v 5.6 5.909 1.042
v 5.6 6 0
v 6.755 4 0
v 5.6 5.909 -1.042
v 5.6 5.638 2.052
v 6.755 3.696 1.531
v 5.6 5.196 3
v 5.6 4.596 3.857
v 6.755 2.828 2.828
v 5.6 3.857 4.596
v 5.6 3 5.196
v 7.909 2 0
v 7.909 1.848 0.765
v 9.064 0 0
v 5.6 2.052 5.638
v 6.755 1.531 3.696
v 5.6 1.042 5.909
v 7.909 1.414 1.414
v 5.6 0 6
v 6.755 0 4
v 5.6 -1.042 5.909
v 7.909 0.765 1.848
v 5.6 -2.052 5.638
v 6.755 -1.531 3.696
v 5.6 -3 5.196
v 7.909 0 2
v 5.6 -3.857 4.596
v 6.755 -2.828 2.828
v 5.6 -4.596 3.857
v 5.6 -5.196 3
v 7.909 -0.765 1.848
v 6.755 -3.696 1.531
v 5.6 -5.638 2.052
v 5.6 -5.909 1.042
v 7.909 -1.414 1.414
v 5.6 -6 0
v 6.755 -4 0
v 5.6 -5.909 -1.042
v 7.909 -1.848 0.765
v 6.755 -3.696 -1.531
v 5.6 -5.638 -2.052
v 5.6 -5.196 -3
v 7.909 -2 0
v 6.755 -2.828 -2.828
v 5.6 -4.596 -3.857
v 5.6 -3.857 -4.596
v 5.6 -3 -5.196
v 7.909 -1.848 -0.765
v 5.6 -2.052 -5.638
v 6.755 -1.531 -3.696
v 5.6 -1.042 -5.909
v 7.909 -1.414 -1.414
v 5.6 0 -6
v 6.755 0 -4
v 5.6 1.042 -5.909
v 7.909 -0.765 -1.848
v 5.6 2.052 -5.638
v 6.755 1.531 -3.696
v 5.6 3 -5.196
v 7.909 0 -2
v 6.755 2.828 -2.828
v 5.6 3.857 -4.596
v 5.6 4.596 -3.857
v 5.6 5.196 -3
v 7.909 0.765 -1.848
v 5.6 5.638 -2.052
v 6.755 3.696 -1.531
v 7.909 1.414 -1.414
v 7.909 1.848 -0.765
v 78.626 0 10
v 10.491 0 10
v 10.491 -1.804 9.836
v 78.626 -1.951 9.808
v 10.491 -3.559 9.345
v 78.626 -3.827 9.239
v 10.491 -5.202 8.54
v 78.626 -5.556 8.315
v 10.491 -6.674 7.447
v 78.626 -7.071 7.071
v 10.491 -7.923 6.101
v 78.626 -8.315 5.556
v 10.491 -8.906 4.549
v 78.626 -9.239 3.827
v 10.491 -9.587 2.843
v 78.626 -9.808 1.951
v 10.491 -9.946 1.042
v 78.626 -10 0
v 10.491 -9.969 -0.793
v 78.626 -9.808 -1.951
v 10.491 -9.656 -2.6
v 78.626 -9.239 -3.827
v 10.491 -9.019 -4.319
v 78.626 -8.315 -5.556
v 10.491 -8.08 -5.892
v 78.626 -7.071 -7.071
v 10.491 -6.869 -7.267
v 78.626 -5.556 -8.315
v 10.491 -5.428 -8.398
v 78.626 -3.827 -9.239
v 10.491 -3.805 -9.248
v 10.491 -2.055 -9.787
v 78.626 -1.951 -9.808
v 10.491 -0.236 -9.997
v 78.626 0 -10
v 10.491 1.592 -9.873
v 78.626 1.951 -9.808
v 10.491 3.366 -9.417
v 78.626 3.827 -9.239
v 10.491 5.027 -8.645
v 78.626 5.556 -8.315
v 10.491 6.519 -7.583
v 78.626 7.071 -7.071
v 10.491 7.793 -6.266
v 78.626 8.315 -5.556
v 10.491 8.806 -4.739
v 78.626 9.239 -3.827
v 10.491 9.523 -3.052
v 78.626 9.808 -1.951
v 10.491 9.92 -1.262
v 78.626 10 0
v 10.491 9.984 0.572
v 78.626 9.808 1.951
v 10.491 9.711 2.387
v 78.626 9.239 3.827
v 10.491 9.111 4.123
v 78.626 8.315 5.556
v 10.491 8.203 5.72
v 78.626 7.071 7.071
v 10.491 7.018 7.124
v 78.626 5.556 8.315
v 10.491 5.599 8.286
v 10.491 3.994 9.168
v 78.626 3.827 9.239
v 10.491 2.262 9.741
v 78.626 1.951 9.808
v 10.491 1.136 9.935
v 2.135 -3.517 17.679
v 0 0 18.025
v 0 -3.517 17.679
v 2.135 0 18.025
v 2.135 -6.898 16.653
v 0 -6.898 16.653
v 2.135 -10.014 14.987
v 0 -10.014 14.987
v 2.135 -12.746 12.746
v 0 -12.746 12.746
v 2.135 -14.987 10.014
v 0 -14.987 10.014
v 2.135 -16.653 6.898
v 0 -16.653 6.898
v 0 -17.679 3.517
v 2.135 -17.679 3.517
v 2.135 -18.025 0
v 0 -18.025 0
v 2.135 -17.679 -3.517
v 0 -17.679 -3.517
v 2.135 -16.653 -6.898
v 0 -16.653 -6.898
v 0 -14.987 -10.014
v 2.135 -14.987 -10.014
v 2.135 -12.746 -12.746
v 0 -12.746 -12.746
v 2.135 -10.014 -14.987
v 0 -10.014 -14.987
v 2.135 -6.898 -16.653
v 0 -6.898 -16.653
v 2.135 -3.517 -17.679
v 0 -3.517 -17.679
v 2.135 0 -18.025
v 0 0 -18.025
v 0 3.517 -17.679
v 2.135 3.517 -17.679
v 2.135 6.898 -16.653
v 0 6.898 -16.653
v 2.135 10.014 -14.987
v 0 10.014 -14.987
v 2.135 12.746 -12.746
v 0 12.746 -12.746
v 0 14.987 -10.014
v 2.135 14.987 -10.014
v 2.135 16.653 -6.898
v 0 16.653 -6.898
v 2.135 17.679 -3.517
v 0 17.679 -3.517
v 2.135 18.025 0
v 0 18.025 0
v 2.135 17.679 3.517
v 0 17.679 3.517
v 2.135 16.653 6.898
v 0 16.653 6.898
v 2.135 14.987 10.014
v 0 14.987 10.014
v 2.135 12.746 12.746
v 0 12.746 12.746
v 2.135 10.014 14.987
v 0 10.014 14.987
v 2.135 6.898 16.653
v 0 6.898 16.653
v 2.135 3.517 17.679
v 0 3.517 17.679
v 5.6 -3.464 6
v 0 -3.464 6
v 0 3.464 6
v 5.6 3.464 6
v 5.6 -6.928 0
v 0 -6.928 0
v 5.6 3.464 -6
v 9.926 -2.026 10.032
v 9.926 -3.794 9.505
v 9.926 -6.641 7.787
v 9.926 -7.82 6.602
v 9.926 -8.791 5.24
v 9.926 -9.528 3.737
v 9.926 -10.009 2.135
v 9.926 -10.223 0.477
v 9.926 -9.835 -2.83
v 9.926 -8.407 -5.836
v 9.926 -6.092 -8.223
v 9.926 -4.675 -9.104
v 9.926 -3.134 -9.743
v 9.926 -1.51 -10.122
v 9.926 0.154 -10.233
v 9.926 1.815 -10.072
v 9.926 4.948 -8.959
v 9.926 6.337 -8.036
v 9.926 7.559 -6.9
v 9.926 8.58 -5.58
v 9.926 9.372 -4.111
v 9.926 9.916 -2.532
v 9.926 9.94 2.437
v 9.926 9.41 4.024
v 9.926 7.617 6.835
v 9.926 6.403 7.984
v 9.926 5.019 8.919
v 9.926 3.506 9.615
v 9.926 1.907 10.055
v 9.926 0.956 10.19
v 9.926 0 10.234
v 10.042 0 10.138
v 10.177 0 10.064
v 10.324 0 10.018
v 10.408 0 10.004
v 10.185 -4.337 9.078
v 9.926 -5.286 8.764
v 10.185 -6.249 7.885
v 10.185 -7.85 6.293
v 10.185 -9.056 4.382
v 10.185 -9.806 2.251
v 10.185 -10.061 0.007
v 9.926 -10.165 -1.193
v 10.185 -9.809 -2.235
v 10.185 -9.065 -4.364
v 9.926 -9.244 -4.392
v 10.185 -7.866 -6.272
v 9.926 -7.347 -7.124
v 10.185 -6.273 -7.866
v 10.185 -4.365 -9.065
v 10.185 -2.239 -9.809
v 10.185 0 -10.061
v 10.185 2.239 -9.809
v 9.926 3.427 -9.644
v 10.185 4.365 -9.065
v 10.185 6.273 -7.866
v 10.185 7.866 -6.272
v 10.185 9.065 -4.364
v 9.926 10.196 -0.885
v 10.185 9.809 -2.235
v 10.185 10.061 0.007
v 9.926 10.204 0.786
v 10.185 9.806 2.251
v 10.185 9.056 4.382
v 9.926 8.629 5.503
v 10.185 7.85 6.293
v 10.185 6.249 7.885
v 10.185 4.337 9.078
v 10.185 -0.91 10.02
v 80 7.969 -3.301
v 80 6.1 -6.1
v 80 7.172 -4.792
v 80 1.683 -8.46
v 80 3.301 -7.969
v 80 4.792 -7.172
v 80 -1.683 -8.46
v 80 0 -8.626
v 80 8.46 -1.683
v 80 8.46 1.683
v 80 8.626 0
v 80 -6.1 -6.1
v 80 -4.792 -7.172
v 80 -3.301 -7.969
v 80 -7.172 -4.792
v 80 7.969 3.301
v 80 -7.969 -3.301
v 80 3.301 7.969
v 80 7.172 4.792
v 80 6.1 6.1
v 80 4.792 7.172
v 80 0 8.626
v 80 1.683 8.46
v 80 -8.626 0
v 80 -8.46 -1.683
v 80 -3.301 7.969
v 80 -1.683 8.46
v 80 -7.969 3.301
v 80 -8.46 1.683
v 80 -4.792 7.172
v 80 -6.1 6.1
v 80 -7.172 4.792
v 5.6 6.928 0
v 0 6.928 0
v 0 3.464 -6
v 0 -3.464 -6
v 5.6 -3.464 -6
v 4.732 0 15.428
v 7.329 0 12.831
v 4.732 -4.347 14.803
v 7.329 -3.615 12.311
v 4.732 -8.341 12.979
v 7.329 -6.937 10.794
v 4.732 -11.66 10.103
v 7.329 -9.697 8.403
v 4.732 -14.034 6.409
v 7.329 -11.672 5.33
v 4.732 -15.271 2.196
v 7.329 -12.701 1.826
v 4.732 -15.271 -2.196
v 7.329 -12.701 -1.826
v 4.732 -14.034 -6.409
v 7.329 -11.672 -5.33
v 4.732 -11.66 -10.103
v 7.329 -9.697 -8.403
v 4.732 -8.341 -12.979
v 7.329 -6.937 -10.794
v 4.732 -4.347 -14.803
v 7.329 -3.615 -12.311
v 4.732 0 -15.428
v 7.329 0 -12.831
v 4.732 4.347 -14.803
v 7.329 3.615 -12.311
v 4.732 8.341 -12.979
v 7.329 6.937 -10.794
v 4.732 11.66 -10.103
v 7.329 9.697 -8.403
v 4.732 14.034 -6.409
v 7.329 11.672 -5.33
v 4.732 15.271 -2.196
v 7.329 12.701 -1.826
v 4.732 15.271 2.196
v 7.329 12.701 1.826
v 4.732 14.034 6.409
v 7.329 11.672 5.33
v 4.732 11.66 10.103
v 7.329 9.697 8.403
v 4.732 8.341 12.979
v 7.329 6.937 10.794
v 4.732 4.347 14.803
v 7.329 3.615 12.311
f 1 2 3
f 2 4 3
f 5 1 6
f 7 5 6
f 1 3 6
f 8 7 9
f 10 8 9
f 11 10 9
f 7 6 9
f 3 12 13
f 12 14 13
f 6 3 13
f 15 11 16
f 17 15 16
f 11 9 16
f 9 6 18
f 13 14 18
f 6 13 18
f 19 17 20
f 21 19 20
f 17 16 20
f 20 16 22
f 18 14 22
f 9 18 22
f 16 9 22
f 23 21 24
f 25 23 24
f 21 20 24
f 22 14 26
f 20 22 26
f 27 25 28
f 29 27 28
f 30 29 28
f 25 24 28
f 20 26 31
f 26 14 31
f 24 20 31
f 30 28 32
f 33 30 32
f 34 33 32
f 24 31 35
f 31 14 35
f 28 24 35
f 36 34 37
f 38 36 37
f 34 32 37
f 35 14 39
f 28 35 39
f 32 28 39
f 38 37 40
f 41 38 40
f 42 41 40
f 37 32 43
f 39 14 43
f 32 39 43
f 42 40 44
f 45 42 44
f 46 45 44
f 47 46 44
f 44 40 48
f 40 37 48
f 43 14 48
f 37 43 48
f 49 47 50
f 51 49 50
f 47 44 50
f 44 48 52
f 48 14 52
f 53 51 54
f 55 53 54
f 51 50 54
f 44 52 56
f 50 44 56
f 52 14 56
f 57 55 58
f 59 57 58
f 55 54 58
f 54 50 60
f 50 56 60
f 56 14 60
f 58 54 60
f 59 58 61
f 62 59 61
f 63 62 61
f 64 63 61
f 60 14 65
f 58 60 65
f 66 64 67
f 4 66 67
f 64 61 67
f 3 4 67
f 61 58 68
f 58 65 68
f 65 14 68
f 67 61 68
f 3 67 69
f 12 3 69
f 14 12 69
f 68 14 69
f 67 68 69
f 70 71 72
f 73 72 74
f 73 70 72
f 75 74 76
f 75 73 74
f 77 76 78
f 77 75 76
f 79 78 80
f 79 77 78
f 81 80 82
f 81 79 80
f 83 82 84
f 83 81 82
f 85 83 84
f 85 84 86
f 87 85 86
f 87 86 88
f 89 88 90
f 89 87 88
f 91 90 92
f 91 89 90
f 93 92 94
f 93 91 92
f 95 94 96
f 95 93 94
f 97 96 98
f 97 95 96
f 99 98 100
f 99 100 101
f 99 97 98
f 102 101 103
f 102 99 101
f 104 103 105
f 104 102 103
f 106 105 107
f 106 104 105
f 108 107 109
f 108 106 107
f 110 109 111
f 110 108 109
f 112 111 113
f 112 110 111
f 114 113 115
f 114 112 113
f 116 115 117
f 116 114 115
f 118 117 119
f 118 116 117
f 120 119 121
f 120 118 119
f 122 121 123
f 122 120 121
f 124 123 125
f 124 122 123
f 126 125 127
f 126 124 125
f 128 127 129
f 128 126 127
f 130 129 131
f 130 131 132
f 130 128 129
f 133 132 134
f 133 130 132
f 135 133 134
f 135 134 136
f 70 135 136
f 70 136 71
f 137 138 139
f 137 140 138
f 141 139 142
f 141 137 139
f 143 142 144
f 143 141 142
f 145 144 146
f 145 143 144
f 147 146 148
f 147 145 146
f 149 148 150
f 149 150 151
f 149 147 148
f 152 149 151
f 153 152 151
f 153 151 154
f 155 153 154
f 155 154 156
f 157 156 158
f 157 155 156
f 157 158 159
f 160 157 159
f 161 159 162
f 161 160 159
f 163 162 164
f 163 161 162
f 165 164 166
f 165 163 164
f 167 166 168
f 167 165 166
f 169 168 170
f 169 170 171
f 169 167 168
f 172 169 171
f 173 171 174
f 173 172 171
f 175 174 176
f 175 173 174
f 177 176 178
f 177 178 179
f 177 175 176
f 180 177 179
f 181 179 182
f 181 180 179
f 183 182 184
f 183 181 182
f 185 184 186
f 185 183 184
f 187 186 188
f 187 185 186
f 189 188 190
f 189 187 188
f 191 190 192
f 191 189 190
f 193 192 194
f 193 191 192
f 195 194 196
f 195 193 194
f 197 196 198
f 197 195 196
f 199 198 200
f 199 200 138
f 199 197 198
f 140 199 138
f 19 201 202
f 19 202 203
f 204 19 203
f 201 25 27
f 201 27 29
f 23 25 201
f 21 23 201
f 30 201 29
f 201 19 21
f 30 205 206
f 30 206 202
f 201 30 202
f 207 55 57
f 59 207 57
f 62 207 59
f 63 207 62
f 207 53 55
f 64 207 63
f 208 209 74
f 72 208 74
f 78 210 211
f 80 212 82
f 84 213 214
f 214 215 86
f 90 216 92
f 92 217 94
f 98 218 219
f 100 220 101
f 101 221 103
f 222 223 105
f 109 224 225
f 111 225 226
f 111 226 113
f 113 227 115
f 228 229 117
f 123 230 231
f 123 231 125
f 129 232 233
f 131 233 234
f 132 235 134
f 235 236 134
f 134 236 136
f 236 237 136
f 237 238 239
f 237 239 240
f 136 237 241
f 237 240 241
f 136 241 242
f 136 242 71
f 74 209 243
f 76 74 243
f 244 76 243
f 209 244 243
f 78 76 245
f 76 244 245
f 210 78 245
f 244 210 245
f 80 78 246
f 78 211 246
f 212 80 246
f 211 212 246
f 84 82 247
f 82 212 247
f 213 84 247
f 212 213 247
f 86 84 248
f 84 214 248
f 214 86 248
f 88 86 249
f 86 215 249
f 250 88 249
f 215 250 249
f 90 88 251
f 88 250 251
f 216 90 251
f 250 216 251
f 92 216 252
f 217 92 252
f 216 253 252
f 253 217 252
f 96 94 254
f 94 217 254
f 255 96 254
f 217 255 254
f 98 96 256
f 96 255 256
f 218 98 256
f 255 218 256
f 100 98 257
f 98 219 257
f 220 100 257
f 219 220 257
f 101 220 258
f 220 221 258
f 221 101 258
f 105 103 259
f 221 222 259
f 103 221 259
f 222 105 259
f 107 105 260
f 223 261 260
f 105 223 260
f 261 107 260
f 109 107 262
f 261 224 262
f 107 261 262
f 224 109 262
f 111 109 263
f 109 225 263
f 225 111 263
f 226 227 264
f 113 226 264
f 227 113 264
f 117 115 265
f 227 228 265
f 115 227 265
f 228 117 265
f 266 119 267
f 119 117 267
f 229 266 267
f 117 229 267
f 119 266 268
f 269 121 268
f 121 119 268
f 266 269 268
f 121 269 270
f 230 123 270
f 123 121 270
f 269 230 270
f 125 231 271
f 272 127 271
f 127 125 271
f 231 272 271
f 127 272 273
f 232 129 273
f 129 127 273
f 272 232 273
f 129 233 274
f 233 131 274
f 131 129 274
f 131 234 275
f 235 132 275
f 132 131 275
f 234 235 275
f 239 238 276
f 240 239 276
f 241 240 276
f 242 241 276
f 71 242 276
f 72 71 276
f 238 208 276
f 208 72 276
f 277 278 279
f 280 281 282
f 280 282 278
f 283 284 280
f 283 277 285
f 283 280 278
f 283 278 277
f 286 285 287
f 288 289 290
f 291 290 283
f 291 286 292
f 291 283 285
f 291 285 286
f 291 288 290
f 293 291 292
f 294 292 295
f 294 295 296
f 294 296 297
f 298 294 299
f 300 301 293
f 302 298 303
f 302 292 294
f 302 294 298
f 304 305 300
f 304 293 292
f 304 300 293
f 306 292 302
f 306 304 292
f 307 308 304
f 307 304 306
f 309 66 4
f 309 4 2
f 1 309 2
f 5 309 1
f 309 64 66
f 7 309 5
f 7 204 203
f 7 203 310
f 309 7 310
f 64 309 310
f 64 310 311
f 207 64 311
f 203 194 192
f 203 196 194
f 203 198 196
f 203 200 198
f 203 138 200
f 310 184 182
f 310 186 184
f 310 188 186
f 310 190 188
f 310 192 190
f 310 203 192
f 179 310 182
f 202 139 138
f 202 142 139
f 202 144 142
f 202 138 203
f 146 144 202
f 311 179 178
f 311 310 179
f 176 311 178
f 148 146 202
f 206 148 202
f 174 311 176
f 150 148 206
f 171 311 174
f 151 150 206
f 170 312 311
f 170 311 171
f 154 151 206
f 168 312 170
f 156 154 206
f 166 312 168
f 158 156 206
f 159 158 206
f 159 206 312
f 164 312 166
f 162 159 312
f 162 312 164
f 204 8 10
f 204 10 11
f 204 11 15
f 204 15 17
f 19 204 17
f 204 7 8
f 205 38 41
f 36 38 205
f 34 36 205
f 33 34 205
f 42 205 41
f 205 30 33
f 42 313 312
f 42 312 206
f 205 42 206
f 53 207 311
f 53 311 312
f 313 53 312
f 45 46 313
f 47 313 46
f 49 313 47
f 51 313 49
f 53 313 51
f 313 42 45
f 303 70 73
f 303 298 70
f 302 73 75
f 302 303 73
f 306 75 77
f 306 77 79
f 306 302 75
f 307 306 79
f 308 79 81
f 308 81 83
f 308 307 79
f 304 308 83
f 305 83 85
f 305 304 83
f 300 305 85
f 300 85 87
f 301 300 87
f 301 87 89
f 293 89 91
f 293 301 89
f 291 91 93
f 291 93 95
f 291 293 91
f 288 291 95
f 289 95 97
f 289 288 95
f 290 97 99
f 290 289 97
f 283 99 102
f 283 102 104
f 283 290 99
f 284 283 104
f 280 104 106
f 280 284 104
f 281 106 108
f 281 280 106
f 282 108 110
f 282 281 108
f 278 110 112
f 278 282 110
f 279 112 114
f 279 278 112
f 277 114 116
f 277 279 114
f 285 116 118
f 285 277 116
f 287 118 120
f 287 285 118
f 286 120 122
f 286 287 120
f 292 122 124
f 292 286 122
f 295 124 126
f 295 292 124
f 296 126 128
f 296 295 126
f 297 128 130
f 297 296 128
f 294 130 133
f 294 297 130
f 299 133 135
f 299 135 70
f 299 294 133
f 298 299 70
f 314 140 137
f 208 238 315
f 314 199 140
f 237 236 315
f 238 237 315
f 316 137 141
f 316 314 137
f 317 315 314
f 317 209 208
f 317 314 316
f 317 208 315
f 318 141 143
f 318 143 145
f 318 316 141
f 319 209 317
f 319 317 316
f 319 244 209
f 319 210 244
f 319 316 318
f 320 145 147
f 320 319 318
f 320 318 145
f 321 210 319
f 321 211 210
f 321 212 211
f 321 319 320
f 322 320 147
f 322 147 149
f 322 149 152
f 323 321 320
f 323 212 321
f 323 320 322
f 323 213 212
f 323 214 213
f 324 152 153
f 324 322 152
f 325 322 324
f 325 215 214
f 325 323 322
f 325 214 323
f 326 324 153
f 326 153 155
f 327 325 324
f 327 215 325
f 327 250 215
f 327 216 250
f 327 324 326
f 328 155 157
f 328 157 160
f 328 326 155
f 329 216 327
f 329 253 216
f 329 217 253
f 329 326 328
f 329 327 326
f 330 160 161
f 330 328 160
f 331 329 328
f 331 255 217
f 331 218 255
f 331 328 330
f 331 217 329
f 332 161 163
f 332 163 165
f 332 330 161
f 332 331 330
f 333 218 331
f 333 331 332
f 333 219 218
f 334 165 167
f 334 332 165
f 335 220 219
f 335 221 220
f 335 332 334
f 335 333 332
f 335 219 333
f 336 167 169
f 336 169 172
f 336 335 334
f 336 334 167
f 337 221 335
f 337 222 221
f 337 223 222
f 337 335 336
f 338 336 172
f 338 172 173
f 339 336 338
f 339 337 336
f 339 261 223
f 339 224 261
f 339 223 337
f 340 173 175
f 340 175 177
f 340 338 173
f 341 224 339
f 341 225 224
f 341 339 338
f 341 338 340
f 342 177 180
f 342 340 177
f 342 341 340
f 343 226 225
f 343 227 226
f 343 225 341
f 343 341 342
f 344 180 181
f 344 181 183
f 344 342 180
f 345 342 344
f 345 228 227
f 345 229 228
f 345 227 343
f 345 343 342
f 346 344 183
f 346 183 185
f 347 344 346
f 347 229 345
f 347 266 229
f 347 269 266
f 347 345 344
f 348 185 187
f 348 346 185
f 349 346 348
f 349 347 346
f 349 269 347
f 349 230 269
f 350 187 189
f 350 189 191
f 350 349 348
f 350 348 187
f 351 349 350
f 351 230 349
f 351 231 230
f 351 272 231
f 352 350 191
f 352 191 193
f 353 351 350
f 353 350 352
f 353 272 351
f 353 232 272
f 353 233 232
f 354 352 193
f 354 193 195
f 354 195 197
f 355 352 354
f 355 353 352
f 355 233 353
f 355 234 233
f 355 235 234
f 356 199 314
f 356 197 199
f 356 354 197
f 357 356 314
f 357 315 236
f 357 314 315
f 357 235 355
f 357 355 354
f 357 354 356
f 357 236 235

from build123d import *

# Parameters (mm, degrees)
FILLET1_R   = 0.8
HEX_START   = -5.6
HEX_2_DEPTH = 5.6


with BuildPart() as part:
    # BodySke → BaseBody (revolve)
    with BuildSketch(Plane.XY, mode=Mode.PRIVATE) as basebody_sk:
        Polygon((0, 0), (0, 18.025), (2.135, 18.025), (10.16, 10), (78.626, 10), (80, 8.626), (80, 0), align=None)
    revolve(basebody_sk.sketch.rotate(Axis((0, 0, 0), (1, 0, 0)), 90), axis=Axis((0, 0, 0), (1, 0, 0)))

    # Fillet1
    fillet1_edges = [part.edges().sort_by_distance(p)[0] for p in [
        (10.16, 0, -10),
    ]]
    fillet(fillet1_edges, radius=FILLET1_R)

    # Hex 2: read off the stored shape, not the designer's step
    # Hex 2 outline → Hex 2 (cut)
    with BuildSketch(Plane.ZY.offset(HEX_START)):
        Polygon((-6, -3.464101615), (0, -6.92820323), (6, -3.464101615), (6, 3.464101615), (0, 6.92820323), (-6, 3.464101615), align=None)
    extrude(amount=HEX_2_DEPTH, mode=Mode.SUBTRACT)

    # Hex 2 2 outline → Hex 2 2 (revolve, cut)
    with BuildSketch(Plane.YX):
        Polygon((6, 5.6), (0, 9.064101615), (0, 5.6), align=None)
    revolve(axis=Axis((0, 0, 0), (1, 0, 0)), mode=Mode.SUBTRACT)


solid = part.part
